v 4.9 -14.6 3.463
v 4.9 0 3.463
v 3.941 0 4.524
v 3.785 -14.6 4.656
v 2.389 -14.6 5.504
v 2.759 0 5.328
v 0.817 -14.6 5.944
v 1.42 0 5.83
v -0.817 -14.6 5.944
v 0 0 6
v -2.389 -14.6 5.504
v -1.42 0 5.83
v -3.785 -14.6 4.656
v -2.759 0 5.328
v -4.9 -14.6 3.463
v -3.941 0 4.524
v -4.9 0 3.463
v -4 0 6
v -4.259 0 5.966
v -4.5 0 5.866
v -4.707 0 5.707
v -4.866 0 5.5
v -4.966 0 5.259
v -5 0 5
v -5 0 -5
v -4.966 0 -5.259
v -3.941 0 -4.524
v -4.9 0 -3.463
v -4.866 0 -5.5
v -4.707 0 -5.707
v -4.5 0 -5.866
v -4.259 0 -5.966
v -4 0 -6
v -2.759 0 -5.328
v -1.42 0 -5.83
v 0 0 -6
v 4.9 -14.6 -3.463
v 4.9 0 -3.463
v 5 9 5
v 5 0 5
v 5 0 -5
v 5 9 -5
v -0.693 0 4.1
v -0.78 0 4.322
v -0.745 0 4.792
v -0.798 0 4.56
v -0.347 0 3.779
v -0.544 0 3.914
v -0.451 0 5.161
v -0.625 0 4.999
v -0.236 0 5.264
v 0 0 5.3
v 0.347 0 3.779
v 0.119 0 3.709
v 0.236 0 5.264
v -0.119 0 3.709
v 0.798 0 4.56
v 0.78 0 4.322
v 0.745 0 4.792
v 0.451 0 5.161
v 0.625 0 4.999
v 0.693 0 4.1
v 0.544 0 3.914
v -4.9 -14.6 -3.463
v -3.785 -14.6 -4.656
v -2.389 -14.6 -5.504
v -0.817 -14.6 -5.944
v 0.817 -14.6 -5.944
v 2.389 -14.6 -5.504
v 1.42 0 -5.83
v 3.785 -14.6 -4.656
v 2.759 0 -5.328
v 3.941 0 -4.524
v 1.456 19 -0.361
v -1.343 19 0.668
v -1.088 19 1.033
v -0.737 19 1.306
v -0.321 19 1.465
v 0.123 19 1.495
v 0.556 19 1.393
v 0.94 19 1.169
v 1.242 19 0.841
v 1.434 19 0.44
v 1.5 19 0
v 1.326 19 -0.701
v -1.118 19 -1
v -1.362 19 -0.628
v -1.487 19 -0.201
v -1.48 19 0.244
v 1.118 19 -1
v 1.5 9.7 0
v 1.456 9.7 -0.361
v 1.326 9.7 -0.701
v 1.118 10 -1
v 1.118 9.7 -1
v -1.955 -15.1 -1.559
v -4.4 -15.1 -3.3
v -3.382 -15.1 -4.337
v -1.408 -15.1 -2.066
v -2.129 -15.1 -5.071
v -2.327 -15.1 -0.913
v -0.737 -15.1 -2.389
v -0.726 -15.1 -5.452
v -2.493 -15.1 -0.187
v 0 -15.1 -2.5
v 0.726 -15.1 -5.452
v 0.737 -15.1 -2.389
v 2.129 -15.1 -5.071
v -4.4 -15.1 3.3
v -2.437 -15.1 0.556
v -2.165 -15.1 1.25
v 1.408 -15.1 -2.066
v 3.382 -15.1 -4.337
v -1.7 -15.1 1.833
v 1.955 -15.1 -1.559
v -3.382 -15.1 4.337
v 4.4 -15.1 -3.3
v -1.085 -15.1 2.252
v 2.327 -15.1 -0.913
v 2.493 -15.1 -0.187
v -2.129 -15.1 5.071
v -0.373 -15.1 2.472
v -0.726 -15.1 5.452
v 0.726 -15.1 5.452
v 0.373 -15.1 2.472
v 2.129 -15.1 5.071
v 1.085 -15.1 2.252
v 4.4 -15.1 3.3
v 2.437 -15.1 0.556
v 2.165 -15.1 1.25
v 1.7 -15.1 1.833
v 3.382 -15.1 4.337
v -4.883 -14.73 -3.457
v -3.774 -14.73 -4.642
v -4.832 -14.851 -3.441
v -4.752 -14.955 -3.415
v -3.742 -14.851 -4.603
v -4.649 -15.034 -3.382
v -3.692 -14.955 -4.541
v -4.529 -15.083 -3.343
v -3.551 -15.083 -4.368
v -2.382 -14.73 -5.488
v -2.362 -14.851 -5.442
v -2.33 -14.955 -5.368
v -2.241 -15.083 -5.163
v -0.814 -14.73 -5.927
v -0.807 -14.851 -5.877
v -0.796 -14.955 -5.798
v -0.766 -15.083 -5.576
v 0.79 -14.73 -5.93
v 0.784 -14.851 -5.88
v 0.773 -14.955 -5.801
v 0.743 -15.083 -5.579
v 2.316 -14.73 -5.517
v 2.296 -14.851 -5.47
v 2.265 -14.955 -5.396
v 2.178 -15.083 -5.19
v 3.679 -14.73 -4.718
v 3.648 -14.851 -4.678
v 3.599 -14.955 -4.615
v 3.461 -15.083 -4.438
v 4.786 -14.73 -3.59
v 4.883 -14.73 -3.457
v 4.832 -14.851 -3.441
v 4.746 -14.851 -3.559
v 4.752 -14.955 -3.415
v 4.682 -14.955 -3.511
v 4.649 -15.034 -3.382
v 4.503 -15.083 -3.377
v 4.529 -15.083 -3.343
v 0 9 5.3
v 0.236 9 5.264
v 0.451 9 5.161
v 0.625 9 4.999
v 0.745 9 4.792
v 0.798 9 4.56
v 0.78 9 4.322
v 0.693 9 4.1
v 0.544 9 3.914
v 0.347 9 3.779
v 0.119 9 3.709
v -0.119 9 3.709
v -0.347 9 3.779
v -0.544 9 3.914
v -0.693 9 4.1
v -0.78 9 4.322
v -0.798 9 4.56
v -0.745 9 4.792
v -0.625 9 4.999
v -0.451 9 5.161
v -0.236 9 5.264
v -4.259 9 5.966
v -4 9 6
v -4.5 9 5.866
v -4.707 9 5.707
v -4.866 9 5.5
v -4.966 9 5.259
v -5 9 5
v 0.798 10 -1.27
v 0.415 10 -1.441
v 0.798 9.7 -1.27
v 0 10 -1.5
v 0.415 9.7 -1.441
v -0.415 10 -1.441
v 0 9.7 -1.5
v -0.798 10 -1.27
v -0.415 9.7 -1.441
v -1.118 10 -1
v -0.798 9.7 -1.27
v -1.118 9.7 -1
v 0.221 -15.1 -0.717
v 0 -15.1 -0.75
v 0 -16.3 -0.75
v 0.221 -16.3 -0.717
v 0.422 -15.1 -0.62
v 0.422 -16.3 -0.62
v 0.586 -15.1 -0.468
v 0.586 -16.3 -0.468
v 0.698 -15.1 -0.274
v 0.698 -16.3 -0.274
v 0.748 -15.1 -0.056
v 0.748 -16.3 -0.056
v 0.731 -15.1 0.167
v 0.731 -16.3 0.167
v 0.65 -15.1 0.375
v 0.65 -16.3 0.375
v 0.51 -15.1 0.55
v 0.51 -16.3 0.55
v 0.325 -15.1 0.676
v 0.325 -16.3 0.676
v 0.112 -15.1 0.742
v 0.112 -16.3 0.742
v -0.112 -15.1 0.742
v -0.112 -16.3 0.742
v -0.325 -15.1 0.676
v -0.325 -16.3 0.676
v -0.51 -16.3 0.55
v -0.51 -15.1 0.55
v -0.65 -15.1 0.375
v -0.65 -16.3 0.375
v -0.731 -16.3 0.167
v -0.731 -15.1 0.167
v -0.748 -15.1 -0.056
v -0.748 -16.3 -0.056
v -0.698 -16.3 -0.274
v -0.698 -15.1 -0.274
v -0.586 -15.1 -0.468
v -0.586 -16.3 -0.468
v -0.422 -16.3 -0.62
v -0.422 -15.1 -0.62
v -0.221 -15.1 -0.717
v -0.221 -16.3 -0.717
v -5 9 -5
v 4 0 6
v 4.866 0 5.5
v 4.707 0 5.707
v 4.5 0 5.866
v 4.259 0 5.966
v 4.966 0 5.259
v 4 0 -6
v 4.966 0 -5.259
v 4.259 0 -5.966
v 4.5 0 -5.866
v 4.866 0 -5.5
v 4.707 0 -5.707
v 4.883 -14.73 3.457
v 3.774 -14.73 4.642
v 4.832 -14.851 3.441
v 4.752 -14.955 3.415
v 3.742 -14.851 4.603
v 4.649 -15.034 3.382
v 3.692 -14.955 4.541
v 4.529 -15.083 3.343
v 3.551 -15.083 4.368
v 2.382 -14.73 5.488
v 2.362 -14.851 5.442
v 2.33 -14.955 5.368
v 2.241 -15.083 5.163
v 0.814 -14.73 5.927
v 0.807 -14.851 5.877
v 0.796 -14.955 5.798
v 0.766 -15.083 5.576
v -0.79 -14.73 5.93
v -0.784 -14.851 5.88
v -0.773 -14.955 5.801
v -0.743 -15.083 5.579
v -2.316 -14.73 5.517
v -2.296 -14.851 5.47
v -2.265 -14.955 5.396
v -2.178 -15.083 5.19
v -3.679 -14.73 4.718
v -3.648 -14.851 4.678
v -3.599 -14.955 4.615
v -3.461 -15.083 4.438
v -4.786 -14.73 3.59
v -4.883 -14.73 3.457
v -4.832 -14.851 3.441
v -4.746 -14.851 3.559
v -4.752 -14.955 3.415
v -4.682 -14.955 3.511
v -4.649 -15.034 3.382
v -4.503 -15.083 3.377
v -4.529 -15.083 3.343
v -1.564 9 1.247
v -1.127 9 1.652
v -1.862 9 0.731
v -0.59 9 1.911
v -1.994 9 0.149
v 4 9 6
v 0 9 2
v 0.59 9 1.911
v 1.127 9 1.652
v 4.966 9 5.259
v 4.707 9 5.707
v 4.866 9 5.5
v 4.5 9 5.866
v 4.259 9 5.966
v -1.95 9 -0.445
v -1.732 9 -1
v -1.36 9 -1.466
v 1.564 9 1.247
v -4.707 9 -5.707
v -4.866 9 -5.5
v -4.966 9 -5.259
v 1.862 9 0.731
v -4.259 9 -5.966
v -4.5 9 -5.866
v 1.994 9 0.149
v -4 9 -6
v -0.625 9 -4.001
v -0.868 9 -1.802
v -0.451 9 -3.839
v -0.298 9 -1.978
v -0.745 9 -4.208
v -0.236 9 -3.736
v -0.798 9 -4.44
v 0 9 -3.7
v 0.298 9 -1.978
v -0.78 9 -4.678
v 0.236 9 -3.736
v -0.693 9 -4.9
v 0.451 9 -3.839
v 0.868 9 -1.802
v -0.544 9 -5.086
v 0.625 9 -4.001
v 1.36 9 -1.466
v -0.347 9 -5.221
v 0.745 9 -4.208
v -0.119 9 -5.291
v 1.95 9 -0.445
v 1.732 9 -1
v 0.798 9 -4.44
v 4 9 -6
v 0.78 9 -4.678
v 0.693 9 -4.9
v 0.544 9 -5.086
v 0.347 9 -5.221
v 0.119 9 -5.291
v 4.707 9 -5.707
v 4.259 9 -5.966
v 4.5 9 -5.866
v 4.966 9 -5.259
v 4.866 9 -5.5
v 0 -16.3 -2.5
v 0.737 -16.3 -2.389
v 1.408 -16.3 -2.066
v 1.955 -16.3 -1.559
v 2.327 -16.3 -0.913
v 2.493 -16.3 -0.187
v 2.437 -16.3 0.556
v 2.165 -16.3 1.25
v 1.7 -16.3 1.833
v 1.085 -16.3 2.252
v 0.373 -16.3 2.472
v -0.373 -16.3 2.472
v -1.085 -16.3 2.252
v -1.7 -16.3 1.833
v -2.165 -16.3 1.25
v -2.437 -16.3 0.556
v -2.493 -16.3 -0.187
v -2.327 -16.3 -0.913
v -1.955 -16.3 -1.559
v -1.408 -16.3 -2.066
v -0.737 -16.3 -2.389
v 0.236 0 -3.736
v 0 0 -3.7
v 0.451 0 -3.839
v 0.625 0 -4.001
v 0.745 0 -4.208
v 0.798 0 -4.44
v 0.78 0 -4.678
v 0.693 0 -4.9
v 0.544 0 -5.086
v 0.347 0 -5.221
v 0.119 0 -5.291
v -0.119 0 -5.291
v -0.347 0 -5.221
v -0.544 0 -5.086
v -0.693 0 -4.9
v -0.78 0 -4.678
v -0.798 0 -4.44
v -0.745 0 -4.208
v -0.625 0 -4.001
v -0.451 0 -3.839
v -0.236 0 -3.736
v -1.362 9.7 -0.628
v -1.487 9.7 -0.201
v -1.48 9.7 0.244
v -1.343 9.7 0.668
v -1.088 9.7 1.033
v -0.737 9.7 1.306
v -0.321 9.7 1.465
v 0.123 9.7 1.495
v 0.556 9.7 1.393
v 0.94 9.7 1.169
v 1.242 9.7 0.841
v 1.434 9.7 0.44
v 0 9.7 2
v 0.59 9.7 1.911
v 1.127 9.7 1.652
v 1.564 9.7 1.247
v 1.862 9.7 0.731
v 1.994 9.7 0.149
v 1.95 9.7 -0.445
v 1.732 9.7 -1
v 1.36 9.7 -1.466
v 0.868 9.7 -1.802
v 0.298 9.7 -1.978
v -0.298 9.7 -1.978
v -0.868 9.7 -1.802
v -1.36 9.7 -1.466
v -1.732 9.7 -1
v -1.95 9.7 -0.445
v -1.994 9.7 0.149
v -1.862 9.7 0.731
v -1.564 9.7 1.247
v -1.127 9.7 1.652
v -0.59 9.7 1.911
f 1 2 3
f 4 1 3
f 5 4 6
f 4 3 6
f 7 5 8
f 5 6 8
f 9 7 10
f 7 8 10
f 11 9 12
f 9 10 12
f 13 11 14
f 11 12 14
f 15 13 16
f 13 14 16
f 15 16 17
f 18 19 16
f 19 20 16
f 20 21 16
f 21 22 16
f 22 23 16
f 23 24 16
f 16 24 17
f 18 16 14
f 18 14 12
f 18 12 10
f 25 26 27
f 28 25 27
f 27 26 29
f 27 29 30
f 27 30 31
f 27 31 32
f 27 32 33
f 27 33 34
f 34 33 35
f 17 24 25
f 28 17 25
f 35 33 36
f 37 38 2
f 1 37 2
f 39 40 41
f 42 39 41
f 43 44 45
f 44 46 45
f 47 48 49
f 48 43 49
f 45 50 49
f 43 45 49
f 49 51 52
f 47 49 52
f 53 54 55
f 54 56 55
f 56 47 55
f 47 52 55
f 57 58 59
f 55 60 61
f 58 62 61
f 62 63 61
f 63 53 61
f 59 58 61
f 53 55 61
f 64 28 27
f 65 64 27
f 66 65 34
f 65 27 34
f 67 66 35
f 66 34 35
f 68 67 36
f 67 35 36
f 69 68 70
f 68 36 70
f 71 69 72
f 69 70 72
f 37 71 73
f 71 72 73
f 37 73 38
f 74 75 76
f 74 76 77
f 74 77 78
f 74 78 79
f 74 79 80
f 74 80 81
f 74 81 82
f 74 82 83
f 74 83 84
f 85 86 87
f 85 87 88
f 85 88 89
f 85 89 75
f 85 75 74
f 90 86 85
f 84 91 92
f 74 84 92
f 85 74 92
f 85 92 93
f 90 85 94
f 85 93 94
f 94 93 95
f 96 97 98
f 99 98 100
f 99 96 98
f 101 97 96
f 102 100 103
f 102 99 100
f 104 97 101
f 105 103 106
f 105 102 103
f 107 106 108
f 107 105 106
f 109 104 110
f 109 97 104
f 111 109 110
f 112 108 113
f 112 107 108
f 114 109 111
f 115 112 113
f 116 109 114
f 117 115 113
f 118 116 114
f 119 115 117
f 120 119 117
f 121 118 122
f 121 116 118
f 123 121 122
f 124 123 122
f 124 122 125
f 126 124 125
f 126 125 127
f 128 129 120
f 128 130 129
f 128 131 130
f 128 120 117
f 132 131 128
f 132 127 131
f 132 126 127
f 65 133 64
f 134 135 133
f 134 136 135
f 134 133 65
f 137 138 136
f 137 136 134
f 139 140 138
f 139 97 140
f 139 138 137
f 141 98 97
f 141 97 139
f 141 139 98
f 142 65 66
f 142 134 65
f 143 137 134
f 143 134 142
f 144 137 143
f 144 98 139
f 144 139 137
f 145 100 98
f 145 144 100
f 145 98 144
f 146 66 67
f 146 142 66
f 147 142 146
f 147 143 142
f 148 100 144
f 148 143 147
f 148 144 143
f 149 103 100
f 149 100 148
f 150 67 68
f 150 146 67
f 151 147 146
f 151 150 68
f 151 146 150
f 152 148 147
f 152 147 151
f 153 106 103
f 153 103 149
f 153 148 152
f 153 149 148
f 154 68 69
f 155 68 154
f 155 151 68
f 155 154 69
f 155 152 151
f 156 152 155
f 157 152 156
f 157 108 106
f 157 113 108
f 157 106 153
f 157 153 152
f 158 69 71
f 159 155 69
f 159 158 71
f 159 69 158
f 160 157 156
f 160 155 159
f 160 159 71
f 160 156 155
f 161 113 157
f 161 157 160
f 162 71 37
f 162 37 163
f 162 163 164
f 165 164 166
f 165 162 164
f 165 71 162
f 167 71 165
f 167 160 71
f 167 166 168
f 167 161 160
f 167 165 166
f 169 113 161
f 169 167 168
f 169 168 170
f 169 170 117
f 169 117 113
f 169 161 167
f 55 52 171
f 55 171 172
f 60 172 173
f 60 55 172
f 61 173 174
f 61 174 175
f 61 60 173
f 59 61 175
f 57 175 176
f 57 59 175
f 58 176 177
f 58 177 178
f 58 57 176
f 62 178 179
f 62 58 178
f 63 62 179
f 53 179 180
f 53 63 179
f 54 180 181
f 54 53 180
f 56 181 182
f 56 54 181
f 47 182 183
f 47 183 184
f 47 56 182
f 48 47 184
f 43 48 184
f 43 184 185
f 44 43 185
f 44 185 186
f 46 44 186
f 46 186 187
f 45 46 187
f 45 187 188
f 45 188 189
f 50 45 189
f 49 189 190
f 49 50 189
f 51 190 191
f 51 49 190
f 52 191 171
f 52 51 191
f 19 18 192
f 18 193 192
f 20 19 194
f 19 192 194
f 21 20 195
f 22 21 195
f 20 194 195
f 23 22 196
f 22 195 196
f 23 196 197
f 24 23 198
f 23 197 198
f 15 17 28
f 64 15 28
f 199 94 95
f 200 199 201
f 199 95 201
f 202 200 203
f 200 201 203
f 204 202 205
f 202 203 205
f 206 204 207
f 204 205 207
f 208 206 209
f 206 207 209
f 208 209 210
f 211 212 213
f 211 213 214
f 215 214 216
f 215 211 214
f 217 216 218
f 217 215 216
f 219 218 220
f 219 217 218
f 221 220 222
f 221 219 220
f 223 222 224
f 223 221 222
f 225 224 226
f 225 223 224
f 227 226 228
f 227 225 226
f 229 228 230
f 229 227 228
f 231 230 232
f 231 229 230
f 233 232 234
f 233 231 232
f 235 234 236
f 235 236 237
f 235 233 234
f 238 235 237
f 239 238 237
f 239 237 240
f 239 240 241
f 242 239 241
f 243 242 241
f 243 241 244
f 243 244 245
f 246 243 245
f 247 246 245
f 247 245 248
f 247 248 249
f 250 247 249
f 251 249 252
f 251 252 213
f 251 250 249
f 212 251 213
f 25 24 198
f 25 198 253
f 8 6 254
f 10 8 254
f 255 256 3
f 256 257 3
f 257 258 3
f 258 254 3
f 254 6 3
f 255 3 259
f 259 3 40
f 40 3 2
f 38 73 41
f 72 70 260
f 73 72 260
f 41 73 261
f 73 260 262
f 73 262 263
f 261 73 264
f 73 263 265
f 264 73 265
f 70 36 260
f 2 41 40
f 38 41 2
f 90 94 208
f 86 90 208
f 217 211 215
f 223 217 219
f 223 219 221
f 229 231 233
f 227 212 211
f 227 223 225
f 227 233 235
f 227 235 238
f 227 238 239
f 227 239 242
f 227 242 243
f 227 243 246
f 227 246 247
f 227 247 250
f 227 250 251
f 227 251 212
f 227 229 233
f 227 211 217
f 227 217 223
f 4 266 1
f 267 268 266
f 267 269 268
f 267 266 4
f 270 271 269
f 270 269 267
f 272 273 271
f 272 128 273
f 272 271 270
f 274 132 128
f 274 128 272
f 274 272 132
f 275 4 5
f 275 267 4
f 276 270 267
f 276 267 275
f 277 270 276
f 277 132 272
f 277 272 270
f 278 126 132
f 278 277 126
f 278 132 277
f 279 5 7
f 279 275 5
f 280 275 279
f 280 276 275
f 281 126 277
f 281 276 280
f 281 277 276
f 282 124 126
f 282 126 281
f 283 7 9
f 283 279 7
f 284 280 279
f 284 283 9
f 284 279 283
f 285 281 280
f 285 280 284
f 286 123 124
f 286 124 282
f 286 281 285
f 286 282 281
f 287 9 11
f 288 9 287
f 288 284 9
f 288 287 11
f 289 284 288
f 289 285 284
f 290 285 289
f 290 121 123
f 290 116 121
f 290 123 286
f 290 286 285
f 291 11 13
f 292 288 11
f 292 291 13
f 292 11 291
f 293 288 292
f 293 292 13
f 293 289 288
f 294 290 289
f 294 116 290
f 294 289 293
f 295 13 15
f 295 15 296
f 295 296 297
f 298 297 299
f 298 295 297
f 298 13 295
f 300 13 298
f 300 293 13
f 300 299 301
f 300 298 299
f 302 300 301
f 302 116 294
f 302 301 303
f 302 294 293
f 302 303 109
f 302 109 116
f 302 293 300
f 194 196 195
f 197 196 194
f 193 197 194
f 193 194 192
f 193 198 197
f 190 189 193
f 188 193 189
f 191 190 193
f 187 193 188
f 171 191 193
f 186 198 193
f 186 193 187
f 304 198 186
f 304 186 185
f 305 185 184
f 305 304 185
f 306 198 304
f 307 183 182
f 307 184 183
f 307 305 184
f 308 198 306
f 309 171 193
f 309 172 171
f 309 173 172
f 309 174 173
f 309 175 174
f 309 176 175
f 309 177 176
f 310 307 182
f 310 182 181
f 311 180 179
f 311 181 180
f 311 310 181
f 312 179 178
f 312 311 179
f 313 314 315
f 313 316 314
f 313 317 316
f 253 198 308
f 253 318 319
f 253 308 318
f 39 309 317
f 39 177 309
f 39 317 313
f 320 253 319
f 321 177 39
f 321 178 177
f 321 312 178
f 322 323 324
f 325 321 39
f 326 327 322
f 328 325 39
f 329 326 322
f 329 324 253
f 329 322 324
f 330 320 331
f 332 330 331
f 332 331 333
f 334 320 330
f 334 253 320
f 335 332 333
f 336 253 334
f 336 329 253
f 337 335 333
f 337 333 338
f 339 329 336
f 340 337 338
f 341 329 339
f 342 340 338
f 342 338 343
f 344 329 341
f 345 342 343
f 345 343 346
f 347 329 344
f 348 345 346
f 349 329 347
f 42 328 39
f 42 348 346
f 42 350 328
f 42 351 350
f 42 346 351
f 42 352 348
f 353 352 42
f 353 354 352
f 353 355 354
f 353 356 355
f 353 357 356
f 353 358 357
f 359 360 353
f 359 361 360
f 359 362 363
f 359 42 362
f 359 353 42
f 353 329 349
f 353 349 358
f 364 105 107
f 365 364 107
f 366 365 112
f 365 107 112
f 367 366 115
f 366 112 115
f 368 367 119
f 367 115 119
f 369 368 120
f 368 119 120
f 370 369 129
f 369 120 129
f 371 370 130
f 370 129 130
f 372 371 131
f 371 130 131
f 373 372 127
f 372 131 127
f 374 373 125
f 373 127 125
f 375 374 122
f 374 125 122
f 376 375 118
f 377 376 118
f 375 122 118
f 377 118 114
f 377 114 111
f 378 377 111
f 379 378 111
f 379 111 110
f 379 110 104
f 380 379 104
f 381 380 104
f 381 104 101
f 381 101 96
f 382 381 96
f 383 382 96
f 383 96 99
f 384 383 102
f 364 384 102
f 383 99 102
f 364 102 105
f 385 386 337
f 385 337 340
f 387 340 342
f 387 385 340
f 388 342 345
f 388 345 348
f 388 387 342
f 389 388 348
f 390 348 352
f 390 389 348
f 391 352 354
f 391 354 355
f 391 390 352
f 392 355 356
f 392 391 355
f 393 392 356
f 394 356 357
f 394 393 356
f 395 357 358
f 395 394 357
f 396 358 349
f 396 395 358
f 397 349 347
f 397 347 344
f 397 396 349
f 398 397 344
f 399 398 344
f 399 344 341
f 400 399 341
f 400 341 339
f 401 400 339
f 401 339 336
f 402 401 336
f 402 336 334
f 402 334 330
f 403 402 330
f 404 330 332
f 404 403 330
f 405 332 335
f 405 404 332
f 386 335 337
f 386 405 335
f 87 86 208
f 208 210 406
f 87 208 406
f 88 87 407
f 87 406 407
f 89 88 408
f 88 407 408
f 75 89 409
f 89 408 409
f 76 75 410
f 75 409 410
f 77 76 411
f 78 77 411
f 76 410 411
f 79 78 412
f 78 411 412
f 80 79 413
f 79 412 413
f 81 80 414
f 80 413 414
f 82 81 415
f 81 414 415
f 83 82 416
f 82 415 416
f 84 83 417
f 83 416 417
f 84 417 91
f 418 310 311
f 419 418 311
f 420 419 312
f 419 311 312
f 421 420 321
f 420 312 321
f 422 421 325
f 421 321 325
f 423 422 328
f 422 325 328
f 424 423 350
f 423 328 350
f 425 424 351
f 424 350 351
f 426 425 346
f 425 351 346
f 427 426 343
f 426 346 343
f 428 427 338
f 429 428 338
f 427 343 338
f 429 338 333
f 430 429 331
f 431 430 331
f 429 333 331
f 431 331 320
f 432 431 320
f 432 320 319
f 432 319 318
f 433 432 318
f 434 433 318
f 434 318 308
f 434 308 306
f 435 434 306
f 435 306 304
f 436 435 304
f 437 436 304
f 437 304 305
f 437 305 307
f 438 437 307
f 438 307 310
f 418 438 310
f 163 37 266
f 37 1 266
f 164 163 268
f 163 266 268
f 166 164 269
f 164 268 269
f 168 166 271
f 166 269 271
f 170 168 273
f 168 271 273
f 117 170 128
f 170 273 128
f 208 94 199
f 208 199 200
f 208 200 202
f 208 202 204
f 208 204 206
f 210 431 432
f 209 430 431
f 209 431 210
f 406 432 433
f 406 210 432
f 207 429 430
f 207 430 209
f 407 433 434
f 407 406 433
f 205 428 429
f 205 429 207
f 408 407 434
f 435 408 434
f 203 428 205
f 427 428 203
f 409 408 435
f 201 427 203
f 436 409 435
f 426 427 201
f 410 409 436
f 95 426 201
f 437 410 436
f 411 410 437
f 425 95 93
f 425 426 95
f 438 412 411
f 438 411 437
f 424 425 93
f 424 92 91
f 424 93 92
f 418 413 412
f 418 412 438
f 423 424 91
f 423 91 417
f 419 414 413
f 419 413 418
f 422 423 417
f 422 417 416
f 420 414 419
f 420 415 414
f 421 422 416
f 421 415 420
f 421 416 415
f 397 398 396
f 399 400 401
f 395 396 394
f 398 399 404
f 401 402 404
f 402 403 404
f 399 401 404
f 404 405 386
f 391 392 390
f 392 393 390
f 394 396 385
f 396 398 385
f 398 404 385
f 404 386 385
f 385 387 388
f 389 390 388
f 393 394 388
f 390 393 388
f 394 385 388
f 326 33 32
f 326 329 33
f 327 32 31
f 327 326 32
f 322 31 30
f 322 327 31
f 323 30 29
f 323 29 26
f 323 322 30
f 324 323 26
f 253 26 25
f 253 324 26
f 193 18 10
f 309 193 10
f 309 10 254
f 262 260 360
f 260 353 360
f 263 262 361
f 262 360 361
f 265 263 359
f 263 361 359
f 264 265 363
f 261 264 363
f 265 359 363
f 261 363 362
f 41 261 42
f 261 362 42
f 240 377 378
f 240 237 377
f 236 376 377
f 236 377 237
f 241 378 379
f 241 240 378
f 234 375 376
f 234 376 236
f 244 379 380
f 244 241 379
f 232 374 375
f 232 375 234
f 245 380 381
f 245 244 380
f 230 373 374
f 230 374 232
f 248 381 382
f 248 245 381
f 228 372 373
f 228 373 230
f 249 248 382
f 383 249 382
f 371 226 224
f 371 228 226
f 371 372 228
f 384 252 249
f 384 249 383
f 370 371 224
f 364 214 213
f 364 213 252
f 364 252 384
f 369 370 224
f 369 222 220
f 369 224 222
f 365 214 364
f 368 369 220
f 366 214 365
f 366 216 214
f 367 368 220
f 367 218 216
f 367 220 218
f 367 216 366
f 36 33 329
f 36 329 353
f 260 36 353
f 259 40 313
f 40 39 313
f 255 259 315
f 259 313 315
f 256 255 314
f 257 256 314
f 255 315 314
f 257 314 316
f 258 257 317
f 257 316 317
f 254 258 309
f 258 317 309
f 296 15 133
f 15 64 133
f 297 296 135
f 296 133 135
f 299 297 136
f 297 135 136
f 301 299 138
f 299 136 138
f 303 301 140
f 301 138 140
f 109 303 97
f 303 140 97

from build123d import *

# Parameters (mm, degrees)
SKETCH_1_W      = 10
SKETCH_1_H      = 12
SKETCH_1_R      = 2
SKETCH_1_R_2    = 0.8
EXTRUDE_1_DEPTH = 9
SKETCH_1_3_R    = 2
SKETCH_1_3_R_2  = 1.5
EXTRUDE_3_DEPTH = 9.7
EXTRUDE_4_DEPTH = 19
SKETCH_1_5_R    = 1.5
EXTRUDE_5_DEPTH = 10
EXTRUDE_6_DEPTH = 15.1
SKETCH_4_R      = 2.5
SKETCH_4_R_2    = 0.75
EXTRUDE_7_DEPTH = 1.2
FILLET_1_R      = 1
FILLET_2_R      = 0.5


with BuildPart() as part:
    # 草图1 → 凸台-拉伸1 (new body)
    with BuildSketch(Plane(origin=(0, 0, 0), x_dir=(1, 0, 0), z_dir=(0, 1, 0))):
        Rectangle(SKETCH_1_W, SKETCH_1_H)
        with Locations(Location((0, 0, 0), (0, 0, 270))):
            Circle(SKETCH_1_R, mode=Mode.SUBTRACT)
        with Locations(Location((0, -4.5, 0), (0, 0, 270))):
            Circle(SKETCH_1_R_2, mode=Mode.SUBTRACT)
        with Locations(Location((0, 4.5, 0), (0, 0, 270))):
            Circle(SKETCH_1_R_2, mode=Mode.SUBTRACT)
    extrude(amount=EXTRUDE_1_DEPTH)

    # 草图1<3> → 凸台-拉伸3 (add)
    with BuildSketch(Plane(origin=(0, 0, 0), x_dir=(1, 0, 0), z_dir=(0, 1, 0))):
        with Locations(Location((0, 0, 0), (0, 0, 270))):
            Circle(SKETCH_1_3_R)
        with Locations(Location((0, 0, 0), (0, 0, 270))):
            Circle(SKETCH_1_3_R_2, mode=Mode.SUBTRACT)
    extrude(amount=EXTRUDE_3_DEPTH)

    # 草图1<4> → 凸台-拉伸4 (add)
    with BuildSketch(Plane(origin=(0, 0, 0), x_dir=(1, 0, 0), z_dir=(0, 1, 0))):
        with BuildLine():
            Line((1.118033989, 1), (-1.118033989, 1))
            ThreePointArc((-1.118033989, 1), (-0.535233135, -1.401258538), (1.5, 0))
            ThreePointArc((1.5, 0), (1.401258538, 0.535233135), (1.118033989, 1))
        make_face()
    extrude(amount=EXTRUDE_4_DEPTH)

    # 草图1<5> → 凸台-拉伸5 (add)
    with BuildSketch(Plane(origin=(0, 0, 0), x_dir=(1, 0, 0), z_dir=(0, 1, 0))):
        with Locations(Location((0, 0, 0), (0, 0, 138.189685104))):
            Circle(SKETCH_1_5_R)
    extrude(amount=EXTRUDE_5_DEPTH)

    # 草图3 → 凸台-拉伸6 (add)
    with BuildSketch(Plane.XZ):
        with BuildLine():
            Line((4.9, -3.462657939), (4.9, 3.462657939))
            ThreePointArc((4.9, 3.462657939), (0, 6), (-4.9, 3.462657939))
            Line((-4.9, 3.462657939), (-4.9, -3.462657939))
            ThreePointArc((-4.9, -3.462657939), (0, -6), (4.9, -3.462657939))
        make_face()
    extrude(amount=EXTRUDE_6_DEPTH)

    # 草图4 → 凸台-拉伸7 (add)
    with BuildSketch(Plane.XZ.offset(15.1)):
        with Locations(Location((0, 0, 0), (0, 0, 270))):
            Circle(SKETCH_4_R)
        with Locations(Location((0, 0, 0), (0, 0, 270))):
            Circle(SKETCH_4_R_2, mode=Mode.SUBTRACT)
    extrude(amount=EXTRUDE_7_DEPTH)

    # 圆角1
    fillet_1_edges = [part.edges().sort_by_distance(p)[0] for p in [
        (5, 4.5, 6),
        (-5, 4.5, 6),
        (-5, 4.5, -6),
        (5, 4.5, -6),
    ]]
    fillet(fillet_1_edges, radius=FILLET_1_R)

    # 圆角2
    fillet_2_edges = [part.edges().sort_by_distance(p)[0] for p in [
        (0, -15.1, 6),
        (-4.9, -15.1, 0),
        (0, -15.1, -6),
        (4.9, -15.1, 0),
    ]]
    fillet(fillet_2_edges, radius=FILLET_2_R)


solid = part.part
